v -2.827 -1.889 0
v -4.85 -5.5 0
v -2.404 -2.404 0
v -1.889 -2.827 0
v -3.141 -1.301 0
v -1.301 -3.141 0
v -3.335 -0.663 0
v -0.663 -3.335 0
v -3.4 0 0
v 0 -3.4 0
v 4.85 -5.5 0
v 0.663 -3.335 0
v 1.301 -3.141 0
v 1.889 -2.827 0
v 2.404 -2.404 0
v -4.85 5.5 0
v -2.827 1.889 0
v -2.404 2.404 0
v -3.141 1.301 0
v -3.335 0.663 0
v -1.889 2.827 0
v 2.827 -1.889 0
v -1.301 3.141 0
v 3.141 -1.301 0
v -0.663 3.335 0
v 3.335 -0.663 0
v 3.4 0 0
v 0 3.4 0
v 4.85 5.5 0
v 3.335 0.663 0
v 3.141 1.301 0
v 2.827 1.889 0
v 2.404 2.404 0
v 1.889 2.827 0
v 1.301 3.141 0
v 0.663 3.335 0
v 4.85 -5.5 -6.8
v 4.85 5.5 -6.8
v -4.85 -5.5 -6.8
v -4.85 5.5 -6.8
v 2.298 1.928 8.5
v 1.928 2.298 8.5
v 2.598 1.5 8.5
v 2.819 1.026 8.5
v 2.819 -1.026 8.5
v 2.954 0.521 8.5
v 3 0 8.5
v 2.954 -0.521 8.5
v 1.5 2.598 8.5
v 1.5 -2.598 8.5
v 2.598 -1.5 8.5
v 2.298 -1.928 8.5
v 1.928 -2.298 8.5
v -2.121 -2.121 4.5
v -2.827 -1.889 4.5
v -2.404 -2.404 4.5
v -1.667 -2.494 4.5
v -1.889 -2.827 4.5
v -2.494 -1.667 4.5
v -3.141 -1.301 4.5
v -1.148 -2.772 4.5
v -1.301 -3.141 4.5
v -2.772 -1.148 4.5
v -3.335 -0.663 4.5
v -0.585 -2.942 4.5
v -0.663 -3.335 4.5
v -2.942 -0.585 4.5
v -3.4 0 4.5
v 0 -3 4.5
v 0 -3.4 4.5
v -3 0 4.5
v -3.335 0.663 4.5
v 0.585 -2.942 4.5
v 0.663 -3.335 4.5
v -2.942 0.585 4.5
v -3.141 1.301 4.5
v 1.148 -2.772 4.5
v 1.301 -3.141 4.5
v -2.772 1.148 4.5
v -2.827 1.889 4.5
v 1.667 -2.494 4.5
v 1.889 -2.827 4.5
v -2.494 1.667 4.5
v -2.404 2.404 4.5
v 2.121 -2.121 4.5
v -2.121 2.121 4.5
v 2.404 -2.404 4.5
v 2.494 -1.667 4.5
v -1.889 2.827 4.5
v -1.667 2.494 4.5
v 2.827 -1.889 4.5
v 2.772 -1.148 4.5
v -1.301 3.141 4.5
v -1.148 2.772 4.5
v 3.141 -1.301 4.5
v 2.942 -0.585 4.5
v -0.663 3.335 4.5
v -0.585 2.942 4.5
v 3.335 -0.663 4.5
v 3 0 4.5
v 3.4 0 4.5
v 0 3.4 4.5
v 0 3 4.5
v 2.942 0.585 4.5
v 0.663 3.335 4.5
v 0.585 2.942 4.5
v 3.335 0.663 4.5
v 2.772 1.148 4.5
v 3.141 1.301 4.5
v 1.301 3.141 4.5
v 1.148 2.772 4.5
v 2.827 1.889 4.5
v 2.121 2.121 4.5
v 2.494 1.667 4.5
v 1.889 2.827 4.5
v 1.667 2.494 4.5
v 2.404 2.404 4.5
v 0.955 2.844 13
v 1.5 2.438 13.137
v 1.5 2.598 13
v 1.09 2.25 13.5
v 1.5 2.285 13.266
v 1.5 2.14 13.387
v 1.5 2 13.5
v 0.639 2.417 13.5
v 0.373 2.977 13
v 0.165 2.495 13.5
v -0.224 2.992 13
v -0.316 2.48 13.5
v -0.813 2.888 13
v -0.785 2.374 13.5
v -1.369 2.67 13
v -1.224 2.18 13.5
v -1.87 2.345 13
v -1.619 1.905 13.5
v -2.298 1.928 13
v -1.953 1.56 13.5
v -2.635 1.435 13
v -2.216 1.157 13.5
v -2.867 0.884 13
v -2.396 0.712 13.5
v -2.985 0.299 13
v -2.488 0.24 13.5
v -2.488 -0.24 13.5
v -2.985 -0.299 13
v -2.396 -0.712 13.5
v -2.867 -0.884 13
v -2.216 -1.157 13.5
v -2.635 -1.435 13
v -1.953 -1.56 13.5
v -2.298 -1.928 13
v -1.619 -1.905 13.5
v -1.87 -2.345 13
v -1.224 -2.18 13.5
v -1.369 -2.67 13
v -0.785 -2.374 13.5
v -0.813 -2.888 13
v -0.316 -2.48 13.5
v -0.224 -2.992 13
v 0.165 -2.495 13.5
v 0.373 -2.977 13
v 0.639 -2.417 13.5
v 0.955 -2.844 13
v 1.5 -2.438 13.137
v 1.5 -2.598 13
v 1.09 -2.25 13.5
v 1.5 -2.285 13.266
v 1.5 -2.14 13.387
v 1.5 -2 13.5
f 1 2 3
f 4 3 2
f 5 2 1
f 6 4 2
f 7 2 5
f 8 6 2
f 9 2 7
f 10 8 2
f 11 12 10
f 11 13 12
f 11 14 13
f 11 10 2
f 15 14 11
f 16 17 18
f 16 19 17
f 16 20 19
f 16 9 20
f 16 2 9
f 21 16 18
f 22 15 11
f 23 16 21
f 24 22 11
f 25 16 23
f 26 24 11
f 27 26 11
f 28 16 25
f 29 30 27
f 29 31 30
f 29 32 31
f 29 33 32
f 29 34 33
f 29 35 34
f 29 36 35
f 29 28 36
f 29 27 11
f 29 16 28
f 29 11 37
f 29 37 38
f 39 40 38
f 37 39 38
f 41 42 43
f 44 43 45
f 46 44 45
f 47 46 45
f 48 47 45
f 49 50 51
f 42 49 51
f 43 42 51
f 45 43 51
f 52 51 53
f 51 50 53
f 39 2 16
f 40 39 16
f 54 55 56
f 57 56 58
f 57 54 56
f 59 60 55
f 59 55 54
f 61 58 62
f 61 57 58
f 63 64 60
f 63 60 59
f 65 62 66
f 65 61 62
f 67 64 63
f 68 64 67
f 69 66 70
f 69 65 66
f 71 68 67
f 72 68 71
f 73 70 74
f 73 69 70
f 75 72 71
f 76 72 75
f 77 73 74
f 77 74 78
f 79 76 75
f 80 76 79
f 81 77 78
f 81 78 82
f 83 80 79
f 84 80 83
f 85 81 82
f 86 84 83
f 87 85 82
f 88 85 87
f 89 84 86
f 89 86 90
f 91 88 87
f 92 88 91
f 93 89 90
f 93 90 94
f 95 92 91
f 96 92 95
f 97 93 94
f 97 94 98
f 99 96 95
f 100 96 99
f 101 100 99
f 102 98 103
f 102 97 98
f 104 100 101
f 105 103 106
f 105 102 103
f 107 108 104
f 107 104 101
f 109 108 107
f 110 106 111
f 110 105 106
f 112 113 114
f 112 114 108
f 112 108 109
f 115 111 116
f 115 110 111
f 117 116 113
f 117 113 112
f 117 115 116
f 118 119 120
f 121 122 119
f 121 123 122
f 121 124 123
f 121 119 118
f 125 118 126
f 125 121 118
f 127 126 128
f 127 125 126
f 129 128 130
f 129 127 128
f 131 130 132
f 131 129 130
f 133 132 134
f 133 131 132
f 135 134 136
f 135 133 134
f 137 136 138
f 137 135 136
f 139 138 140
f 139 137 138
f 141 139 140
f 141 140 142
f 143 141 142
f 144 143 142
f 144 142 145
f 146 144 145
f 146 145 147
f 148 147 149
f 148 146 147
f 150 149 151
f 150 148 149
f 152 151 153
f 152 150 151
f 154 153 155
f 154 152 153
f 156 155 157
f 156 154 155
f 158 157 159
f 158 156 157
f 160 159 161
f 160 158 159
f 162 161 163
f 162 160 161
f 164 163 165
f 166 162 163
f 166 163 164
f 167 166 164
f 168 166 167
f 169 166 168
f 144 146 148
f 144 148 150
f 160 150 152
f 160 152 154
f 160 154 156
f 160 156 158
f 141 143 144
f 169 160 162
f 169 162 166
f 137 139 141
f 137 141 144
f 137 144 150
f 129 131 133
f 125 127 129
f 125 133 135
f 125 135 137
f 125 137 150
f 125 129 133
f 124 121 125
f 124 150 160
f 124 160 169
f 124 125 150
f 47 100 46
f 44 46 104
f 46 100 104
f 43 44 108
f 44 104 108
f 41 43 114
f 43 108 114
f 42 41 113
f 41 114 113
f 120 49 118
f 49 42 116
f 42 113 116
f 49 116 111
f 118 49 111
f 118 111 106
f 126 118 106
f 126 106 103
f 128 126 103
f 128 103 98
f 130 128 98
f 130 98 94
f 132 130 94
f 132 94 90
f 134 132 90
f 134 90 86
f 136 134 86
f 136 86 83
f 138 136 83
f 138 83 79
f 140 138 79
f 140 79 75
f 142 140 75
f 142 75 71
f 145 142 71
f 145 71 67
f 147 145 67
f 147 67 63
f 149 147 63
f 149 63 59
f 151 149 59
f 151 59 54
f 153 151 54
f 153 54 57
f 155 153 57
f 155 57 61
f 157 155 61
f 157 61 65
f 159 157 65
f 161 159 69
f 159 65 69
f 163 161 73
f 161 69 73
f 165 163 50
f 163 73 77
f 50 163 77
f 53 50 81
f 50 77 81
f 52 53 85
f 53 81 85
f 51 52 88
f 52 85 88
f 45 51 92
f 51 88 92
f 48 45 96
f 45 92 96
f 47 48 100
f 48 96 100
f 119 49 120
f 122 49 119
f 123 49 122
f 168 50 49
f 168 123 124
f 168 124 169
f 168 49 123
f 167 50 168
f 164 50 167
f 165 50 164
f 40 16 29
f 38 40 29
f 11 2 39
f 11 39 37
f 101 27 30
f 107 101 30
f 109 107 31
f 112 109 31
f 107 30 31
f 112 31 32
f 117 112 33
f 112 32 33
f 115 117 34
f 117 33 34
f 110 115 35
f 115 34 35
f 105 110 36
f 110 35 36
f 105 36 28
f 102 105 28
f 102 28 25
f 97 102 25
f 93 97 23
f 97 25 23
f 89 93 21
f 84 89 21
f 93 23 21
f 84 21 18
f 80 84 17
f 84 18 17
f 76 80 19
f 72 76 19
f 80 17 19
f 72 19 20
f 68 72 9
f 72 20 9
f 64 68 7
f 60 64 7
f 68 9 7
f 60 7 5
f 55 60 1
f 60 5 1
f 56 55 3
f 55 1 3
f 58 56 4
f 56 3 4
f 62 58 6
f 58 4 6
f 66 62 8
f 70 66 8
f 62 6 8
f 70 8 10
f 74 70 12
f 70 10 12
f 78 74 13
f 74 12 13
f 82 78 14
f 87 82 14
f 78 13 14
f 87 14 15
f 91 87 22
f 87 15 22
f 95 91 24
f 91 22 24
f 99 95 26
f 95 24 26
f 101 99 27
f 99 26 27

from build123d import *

# Parameters (mm, degrees)
SKETCH_W     = 9.7
SKETCH_H     = 11
PAD_DEPTH    = 6.8
SKETCH001_R  = 3.4
PAD001_DEPTH = 4.5
SKETCH002_R  = 3
PAD002_DEPTH = 13.5
SKETCH003_W  = 1.5
SKETCH003_H  = 5
POCKET_DEPTH = 3
CHAMFER_SIZE = 0.5


with BuildPart() as part:
    # Sketch → Pad (new body)
    with BuildSketch(Plane.XY):
        Rectangle(SKETCH_W, SKETCH_H)
    extrude(amount=-PAD_DEPTH)

    # Sketch001 → Pad001 (join)
    with BuildSketch(Plane.XY):
        Circle(SKETCH001_R)
    extrude(amount=PAD001_DEPTH)

    # Sketch002 → Pad002 (join)
    with BuildSketch(Plane.XY):
        Circle(SKETCH002_R)
    extrude(amount=PAD002_DEPTH)

    # Sketch003 → Pocket (cut, symmetric)
    with BuildSketch(Plane.XZ):
        with Locations((2.25, 11)):
            Rectangle(SKETCH003_W, SKETCH003_H)
    extrude(amount=POCKET_DEPTH, both=True, mode=Mode.SUBTRACT)

    # Chamfer
    chamfer_edges = [part.edges().sort_by_distance(p)[0] for p in [
        (-3, 0, 13.5),
    ]]
    chamfer(chamfer_edges, length=CHAMFER_SIZE)


solid = part.part
